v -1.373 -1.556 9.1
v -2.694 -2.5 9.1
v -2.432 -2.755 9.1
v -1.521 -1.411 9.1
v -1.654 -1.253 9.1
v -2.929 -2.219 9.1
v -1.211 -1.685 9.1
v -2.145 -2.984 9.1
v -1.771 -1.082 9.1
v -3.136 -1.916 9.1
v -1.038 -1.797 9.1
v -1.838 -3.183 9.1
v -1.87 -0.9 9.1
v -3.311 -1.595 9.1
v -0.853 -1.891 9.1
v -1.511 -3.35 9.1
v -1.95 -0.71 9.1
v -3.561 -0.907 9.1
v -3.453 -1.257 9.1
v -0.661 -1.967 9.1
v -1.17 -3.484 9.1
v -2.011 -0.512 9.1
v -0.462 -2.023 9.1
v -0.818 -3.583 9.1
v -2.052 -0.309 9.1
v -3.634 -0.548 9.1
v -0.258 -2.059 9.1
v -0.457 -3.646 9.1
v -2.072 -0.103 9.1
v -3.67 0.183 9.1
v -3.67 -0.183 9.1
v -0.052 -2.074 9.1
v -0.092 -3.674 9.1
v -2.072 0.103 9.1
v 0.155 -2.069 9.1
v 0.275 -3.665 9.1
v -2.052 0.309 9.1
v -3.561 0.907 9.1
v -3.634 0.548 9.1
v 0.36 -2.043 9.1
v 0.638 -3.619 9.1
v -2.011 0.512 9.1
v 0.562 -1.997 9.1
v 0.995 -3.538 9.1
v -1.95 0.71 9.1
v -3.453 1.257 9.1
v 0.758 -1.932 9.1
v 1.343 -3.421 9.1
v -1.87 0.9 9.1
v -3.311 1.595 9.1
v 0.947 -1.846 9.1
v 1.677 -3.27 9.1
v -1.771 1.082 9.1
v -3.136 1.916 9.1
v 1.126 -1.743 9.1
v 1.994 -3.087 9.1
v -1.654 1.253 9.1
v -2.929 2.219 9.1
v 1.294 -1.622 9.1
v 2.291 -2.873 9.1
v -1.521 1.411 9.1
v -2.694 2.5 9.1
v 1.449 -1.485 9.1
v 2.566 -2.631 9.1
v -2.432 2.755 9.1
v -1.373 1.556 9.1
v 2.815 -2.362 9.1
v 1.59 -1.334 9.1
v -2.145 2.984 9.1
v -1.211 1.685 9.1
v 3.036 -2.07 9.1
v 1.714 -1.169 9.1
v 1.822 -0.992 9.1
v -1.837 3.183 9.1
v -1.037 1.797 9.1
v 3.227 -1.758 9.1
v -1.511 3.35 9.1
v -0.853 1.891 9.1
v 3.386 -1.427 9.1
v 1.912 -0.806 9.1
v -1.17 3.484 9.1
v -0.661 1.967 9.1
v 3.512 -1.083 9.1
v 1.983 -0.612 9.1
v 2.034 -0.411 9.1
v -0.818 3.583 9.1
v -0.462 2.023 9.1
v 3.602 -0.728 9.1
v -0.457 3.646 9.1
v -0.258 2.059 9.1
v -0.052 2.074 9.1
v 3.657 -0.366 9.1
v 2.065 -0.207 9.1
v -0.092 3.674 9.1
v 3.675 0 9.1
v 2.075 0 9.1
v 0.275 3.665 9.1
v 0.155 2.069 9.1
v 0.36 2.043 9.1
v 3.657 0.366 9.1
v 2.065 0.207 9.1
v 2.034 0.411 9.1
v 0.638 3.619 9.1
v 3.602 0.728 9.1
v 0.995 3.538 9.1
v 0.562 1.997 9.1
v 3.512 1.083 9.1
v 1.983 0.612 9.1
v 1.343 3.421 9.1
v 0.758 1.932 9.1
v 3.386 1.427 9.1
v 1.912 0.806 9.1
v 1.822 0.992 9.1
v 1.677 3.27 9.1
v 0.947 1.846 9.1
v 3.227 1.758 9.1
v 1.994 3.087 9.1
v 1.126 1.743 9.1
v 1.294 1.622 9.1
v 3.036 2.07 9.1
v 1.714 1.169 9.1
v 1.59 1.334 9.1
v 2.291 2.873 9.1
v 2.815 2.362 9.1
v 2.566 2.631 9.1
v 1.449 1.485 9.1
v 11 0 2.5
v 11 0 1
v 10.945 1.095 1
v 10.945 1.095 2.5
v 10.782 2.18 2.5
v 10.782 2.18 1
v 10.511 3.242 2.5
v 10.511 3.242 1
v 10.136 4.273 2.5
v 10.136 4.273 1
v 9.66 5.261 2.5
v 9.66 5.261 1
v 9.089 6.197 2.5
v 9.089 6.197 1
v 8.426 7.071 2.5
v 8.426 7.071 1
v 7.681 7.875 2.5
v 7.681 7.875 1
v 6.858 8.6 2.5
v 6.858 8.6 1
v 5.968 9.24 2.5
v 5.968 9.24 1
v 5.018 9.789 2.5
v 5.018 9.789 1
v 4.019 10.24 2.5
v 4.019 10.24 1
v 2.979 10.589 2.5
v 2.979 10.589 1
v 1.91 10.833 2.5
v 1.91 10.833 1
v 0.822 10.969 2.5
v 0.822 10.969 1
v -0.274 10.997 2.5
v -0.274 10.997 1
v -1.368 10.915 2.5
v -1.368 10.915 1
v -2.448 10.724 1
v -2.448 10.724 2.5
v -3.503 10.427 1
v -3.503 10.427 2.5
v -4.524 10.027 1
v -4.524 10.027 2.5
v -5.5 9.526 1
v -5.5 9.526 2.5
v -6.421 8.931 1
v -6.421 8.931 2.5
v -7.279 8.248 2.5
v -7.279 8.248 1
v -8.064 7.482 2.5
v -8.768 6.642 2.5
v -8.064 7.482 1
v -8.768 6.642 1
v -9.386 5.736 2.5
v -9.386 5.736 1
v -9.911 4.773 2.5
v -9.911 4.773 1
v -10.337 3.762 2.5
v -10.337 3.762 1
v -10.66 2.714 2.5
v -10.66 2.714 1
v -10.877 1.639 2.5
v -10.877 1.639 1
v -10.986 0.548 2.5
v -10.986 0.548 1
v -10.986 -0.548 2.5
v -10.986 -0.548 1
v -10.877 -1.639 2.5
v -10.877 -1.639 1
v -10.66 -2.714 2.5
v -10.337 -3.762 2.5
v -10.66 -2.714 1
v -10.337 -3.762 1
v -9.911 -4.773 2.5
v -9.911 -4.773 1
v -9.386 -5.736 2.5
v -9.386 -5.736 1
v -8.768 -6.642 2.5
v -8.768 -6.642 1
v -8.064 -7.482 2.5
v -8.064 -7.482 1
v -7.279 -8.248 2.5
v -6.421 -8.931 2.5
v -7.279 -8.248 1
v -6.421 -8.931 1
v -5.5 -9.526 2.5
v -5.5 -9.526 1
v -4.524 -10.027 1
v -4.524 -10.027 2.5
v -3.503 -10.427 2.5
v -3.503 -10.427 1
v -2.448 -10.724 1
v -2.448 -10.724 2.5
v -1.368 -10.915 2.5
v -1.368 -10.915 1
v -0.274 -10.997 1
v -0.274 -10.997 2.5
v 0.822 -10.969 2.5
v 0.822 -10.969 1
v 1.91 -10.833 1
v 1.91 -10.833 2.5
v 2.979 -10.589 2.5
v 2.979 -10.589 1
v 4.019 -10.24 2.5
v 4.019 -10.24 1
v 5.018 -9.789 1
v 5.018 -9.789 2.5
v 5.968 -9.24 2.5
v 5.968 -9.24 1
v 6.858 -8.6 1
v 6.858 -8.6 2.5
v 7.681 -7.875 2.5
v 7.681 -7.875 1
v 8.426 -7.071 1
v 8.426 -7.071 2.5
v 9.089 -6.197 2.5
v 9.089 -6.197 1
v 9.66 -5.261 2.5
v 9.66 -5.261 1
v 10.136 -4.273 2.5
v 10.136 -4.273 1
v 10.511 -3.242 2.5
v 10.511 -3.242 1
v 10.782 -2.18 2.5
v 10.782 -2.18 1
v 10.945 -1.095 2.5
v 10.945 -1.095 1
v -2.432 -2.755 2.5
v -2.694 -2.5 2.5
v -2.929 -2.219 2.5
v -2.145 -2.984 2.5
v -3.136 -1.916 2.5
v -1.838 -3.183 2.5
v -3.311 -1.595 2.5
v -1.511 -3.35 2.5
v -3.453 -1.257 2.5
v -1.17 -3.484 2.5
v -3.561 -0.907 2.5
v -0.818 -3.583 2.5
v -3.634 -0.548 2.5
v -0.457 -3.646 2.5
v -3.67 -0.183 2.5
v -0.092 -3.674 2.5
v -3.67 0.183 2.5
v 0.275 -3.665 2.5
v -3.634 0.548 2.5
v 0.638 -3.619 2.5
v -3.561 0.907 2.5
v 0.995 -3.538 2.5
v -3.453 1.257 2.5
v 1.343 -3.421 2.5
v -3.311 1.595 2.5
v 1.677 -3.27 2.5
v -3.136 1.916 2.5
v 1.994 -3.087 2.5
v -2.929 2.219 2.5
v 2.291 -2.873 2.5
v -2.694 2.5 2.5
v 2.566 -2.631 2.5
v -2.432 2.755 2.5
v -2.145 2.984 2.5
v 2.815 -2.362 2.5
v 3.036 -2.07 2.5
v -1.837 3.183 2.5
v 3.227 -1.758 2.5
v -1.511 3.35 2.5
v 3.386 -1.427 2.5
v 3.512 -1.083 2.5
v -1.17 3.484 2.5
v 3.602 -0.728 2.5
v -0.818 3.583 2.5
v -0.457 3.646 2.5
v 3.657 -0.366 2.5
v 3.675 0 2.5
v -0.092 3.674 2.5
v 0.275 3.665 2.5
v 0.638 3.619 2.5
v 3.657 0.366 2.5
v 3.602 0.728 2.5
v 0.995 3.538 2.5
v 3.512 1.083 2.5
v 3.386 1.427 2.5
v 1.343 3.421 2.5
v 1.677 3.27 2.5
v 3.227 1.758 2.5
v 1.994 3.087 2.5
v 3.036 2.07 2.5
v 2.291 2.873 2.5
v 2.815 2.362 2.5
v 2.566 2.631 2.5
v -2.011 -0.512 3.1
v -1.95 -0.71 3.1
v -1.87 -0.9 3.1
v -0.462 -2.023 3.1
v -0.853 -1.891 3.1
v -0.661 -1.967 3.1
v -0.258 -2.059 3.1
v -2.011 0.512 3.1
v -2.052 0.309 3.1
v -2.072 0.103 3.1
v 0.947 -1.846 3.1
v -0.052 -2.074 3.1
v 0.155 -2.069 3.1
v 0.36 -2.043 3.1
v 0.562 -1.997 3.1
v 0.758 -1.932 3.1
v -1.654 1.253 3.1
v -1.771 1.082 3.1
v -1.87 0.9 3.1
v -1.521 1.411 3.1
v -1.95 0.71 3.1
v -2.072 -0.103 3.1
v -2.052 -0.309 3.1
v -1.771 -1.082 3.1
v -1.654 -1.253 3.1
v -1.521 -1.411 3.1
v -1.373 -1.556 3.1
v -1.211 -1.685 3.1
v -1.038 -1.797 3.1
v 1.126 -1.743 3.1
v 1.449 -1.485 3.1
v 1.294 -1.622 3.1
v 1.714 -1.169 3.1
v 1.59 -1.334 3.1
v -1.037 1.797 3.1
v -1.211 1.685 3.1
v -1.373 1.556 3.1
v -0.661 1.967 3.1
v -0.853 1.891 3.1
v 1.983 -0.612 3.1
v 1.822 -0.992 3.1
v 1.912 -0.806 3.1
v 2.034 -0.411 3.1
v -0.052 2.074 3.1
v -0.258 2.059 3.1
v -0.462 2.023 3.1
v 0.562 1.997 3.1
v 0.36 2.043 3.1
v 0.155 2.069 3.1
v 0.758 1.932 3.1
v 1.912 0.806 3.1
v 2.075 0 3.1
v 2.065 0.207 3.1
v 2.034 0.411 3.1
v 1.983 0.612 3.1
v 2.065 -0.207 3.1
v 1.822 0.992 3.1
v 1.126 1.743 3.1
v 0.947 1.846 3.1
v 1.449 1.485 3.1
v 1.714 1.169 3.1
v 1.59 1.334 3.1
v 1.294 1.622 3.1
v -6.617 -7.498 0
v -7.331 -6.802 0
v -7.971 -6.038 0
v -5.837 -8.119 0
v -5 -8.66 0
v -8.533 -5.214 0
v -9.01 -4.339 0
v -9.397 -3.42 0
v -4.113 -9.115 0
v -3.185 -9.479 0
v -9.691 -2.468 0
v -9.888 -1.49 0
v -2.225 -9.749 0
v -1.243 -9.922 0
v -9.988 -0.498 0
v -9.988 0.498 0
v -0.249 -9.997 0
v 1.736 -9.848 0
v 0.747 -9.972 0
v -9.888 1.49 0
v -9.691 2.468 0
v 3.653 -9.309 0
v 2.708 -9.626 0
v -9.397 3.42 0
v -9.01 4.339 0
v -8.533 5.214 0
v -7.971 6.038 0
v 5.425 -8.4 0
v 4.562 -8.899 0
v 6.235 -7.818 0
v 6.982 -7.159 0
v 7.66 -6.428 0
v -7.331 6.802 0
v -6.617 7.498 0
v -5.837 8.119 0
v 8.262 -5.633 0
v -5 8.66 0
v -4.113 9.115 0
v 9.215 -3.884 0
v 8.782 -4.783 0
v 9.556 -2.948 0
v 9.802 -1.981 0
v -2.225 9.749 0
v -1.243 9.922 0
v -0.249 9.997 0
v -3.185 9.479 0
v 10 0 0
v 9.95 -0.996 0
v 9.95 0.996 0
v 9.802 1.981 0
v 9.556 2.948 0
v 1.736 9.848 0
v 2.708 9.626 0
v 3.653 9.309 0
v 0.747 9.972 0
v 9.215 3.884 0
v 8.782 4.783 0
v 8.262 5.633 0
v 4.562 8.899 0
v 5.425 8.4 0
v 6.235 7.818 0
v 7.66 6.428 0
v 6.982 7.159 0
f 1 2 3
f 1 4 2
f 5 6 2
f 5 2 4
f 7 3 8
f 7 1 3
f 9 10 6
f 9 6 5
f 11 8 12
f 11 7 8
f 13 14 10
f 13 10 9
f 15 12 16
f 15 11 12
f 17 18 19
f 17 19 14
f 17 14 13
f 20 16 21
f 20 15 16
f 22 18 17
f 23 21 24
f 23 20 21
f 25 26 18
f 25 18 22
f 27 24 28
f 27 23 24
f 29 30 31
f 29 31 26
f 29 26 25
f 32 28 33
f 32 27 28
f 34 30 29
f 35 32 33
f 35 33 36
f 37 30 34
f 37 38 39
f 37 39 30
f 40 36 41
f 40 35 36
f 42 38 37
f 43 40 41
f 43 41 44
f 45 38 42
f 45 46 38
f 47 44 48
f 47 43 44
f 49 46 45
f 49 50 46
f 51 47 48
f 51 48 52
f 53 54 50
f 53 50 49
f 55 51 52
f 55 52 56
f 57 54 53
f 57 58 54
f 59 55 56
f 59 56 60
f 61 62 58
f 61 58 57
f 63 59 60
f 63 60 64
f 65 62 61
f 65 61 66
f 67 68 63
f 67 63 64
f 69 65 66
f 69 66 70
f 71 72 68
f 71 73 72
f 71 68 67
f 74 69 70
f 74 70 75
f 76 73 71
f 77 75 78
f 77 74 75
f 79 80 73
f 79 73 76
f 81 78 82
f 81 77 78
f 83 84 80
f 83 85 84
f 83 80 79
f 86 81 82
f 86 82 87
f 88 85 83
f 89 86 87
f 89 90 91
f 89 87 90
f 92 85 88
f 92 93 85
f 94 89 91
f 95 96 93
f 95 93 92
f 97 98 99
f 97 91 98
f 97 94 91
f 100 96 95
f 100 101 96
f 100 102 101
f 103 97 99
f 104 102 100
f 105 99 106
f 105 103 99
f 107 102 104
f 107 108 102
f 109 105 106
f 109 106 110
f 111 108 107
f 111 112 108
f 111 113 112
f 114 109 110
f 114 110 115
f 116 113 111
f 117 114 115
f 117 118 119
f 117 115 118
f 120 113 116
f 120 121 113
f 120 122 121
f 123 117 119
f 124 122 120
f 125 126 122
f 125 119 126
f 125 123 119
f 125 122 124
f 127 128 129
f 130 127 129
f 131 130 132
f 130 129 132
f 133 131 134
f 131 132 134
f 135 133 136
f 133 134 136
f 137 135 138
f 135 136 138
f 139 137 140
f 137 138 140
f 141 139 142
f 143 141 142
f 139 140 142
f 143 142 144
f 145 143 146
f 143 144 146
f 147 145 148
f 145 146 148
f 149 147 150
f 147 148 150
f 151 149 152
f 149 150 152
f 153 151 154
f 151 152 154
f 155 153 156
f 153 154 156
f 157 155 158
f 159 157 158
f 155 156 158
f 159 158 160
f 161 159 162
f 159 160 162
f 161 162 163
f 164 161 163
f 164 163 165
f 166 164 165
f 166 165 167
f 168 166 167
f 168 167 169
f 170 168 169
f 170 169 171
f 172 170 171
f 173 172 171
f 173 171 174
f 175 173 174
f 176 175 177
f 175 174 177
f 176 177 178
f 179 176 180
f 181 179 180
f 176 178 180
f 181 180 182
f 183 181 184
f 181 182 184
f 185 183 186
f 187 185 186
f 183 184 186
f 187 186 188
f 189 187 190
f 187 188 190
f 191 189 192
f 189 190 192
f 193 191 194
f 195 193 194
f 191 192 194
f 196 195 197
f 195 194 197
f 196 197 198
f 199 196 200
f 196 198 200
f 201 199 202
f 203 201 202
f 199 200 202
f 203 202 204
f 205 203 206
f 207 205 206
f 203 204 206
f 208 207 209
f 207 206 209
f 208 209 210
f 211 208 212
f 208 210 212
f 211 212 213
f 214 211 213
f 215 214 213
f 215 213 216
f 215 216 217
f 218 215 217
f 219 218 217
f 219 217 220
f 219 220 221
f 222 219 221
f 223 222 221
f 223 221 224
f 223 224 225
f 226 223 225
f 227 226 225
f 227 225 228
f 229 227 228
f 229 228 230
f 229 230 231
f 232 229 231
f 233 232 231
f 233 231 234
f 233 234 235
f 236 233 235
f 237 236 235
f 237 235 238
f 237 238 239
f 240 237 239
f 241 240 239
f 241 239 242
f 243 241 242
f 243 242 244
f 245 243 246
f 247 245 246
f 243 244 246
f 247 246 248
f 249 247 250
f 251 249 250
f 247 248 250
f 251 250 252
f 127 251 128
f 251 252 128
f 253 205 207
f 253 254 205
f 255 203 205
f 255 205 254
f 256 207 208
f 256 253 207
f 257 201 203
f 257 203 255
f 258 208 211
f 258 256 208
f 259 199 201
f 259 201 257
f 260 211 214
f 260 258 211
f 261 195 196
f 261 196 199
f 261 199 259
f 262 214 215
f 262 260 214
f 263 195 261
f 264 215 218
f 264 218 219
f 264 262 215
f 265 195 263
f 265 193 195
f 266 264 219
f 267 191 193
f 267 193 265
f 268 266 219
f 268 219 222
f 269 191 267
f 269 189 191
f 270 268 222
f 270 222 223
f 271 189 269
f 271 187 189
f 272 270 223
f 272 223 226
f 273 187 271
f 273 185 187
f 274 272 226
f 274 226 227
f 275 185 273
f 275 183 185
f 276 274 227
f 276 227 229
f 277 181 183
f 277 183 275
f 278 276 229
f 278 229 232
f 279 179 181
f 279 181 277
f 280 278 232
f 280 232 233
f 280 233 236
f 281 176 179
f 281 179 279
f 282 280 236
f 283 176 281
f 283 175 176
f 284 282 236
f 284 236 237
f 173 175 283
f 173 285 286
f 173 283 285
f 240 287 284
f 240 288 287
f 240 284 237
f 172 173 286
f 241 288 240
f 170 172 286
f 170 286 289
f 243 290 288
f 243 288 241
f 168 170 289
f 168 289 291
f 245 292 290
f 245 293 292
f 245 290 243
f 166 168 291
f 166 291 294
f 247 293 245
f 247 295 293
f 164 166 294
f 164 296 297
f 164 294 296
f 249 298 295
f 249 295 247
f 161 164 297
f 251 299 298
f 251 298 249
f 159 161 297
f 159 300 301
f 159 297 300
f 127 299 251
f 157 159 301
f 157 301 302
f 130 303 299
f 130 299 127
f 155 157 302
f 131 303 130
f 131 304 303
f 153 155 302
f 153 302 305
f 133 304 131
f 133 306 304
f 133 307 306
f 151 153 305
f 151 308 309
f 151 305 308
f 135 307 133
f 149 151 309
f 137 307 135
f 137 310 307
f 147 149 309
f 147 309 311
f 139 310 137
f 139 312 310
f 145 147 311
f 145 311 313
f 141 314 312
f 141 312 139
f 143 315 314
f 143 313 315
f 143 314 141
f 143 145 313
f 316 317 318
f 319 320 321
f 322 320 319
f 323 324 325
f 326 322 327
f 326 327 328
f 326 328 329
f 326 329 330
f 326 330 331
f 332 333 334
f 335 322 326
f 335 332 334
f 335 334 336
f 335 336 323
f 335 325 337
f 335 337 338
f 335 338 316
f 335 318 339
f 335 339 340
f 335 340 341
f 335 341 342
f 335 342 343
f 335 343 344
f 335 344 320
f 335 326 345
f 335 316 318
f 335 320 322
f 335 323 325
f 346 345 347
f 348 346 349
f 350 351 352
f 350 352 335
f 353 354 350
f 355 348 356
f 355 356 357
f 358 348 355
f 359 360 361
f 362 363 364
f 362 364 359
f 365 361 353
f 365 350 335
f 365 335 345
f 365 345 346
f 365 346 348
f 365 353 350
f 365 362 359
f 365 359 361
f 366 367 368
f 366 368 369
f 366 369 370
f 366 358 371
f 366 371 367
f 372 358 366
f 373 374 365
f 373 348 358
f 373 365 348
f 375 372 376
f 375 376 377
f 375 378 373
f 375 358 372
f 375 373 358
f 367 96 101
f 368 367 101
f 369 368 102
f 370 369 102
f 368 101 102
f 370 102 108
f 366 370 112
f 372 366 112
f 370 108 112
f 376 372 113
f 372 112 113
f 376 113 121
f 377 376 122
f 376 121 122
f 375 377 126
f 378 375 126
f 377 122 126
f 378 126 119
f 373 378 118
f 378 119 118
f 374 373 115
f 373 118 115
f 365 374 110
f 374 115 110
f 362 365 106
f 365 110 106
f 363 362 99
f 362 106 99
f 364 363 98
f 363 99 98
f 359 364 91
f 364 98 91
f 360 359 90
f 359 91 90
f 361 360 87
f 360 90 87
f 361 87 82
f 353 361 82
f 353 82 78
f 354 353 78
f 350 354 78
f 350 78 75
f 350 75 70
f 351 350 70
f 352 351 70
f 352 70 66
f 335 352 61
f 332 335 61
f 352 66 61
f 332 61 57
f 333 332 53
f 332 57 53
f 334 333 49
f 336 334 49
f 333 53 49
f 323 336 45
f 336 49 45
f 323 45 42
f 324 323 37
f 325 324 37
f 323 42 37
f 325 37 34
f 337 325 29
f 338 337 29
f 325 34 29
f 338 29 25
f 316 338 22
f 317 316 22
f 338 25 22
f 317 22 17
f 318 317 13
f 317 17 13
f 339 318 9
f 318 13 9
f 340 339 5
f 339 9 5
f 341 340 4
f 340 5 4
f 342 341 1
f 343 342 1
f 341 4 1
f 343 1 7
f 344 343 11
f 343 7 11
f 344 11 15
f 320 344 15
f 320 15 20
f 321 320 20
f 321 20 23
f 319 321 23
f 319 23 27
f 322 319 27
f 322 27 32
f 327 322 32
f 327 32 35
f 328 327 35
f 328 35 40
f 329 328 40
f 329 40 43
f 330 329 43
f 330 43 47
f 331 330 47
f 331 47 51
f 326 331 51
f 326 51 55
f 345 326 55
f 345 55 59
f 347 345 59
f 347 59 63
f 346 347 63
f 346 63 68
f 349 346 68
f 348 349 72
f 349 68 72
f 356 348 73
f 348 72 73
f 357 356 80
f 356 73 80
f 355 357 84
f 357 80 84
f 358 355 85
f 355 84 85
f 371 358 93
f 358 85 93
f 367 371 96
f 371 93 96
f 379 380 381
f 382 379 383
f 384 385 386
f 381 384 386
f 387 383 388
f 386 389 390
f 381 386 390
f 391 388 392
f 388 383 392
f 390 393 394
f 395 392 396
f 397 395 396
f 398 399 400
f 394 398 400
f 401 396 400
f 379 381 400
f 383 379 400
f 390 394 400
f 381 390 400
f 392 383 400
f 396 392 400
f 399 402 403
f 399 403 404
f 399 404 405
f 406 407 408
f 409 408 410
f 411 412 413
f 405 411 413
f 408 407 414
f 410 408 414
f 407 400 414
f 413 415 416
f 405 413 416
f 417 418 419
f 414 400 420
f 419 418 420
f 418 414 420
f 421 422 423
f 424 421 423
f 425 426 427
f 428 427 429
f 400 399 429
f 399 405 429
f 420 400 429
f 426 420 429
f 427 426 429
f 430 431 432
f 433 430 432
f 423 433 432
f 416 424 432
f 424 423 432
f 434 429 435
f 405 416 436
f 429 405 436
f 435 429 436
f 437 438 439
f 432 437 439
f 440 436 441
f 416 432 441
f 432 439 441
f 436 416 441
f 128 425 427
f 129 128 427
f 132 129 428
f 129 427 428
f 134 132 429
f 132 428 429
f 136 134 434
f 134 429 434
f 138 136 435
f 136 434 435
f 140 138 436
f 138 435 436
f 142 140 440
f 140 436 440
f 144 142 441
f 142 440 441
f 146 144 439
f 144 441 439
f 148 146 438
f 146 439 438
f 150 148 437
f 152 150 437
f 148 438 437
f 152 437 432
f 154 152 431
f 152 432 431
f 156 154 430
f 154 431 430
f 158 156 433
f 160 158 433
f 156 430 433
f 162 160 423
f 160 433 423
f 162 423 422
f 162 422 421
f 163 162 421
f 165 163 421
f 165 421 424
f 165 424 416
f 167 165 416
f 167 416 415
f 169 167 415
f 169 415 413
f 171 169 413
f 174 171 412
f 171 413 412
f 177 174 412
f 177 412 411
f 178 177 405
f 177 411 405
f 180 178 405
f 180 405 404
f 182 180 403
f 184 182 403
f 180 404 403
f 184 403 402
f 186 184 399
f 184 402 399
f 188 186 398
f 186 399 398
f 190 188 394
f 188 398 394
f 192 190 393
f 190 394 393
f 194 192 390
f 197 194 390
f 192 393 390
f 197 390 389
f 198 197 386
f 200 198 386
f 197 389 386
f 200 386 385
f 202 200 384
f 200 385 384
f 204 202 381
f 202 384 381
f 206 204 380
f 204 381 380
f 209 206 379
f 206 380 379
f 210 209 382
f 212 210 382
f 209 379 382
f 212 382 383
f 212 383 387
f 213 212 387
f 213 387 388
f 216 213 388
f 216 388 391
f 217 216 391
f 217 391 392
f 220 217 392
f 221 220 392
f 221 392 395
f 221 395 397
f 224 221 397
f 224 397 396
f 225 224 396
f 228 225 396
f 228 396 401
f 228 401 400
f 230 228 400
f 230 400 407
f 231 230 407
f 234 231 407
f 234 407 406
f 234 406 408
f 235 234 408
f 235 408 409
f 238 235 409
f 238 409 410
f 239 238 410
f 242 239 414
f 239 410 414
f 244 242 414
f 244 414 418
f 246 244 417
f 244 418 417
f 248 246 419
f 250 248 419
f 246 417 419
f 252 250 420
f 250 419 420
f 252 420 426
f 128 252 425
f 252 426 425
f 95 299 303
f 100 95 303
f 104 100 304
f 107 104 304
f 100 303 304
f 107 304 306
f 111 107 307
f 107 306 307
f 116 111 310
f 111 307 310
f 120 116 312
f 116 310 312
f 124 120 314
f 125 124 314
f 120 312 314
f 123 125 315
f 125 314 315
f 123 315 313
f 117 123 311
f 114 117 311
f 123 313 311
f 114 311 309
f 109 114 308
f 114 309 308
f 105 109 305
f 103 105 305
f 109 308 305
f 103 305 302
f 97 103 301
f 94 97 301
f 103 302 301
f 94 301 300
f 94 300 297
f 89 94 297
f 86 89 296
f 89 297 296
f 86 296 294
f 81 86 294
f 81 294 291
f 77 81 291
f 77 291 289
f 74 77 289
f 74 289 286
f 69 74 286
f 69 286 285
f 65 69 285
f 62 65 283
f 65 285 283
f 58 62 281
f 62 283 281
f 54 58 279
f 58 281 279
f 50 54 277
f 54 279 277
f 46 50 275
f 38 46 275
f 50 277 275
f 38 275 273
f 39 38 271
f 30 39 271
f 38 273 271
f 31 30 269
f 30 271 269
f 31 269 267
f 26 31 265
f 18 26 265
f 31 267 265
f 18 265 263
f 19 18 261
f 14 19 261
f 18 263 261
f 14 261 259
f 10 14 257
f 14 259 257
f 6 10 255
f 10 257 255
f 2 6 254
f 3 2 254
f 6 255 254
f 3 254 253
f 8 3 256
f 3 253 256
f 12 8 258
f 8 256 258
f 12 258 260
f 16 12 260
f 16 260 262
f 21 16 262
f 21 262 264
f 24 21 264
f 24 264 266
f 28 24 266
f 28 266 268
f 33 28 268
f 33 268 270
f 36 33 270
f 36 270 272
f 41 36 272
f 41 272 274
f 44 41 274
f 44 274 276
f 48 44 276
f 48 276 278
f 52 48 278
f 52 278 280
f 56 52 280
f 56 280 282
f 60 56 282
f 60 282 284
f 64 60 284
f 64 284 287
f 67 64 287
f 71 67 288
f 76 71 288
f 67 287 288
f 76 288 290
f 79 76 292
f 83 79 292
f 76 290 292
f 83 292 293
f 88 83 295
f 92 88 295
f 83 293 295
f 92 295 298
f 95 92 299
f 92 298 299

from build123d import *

# Parameters (mm, degrees)
F0_R     = 11
F1_DEPTH = 2.5
F2_SIZE2 = 1
F2_SIZE  = 1
F3_R     = 3.675
F4_DEPTH = 6.6
F5_R     = 2.075
F6_DEPTH = 6


with BuildPart() as f1:
    # F0 (on Top) → F1 (new body)
    with BuildSketch(Plane.XY):
        Circle(F0_R)
    extrude(amount=F1_DEPTH)

    # F2
    f2_edges = [f1.edges().sort_by_distance(p)[0] for p in [
        (-11, 0, 0),
    ]]
    chamfer(f2_edges, length=F2_SIZE, length2=F2_SIZE2)

    # F3 (on face) → F4 (join)
    with BuildSketch(Plane.XY.offset(2.5)):
        Circle(F3_R)
    extrude(amount=F4_DEPTH)

    # F5 (on face) → F6 (cut)
    with BuildSketch(Plane.XY.offset(9.1)):
        Circle(F5_R)
    extrude(amount=-F6_DEPTH, mode=Mode.SUBTRACT)


solid = f1.part
